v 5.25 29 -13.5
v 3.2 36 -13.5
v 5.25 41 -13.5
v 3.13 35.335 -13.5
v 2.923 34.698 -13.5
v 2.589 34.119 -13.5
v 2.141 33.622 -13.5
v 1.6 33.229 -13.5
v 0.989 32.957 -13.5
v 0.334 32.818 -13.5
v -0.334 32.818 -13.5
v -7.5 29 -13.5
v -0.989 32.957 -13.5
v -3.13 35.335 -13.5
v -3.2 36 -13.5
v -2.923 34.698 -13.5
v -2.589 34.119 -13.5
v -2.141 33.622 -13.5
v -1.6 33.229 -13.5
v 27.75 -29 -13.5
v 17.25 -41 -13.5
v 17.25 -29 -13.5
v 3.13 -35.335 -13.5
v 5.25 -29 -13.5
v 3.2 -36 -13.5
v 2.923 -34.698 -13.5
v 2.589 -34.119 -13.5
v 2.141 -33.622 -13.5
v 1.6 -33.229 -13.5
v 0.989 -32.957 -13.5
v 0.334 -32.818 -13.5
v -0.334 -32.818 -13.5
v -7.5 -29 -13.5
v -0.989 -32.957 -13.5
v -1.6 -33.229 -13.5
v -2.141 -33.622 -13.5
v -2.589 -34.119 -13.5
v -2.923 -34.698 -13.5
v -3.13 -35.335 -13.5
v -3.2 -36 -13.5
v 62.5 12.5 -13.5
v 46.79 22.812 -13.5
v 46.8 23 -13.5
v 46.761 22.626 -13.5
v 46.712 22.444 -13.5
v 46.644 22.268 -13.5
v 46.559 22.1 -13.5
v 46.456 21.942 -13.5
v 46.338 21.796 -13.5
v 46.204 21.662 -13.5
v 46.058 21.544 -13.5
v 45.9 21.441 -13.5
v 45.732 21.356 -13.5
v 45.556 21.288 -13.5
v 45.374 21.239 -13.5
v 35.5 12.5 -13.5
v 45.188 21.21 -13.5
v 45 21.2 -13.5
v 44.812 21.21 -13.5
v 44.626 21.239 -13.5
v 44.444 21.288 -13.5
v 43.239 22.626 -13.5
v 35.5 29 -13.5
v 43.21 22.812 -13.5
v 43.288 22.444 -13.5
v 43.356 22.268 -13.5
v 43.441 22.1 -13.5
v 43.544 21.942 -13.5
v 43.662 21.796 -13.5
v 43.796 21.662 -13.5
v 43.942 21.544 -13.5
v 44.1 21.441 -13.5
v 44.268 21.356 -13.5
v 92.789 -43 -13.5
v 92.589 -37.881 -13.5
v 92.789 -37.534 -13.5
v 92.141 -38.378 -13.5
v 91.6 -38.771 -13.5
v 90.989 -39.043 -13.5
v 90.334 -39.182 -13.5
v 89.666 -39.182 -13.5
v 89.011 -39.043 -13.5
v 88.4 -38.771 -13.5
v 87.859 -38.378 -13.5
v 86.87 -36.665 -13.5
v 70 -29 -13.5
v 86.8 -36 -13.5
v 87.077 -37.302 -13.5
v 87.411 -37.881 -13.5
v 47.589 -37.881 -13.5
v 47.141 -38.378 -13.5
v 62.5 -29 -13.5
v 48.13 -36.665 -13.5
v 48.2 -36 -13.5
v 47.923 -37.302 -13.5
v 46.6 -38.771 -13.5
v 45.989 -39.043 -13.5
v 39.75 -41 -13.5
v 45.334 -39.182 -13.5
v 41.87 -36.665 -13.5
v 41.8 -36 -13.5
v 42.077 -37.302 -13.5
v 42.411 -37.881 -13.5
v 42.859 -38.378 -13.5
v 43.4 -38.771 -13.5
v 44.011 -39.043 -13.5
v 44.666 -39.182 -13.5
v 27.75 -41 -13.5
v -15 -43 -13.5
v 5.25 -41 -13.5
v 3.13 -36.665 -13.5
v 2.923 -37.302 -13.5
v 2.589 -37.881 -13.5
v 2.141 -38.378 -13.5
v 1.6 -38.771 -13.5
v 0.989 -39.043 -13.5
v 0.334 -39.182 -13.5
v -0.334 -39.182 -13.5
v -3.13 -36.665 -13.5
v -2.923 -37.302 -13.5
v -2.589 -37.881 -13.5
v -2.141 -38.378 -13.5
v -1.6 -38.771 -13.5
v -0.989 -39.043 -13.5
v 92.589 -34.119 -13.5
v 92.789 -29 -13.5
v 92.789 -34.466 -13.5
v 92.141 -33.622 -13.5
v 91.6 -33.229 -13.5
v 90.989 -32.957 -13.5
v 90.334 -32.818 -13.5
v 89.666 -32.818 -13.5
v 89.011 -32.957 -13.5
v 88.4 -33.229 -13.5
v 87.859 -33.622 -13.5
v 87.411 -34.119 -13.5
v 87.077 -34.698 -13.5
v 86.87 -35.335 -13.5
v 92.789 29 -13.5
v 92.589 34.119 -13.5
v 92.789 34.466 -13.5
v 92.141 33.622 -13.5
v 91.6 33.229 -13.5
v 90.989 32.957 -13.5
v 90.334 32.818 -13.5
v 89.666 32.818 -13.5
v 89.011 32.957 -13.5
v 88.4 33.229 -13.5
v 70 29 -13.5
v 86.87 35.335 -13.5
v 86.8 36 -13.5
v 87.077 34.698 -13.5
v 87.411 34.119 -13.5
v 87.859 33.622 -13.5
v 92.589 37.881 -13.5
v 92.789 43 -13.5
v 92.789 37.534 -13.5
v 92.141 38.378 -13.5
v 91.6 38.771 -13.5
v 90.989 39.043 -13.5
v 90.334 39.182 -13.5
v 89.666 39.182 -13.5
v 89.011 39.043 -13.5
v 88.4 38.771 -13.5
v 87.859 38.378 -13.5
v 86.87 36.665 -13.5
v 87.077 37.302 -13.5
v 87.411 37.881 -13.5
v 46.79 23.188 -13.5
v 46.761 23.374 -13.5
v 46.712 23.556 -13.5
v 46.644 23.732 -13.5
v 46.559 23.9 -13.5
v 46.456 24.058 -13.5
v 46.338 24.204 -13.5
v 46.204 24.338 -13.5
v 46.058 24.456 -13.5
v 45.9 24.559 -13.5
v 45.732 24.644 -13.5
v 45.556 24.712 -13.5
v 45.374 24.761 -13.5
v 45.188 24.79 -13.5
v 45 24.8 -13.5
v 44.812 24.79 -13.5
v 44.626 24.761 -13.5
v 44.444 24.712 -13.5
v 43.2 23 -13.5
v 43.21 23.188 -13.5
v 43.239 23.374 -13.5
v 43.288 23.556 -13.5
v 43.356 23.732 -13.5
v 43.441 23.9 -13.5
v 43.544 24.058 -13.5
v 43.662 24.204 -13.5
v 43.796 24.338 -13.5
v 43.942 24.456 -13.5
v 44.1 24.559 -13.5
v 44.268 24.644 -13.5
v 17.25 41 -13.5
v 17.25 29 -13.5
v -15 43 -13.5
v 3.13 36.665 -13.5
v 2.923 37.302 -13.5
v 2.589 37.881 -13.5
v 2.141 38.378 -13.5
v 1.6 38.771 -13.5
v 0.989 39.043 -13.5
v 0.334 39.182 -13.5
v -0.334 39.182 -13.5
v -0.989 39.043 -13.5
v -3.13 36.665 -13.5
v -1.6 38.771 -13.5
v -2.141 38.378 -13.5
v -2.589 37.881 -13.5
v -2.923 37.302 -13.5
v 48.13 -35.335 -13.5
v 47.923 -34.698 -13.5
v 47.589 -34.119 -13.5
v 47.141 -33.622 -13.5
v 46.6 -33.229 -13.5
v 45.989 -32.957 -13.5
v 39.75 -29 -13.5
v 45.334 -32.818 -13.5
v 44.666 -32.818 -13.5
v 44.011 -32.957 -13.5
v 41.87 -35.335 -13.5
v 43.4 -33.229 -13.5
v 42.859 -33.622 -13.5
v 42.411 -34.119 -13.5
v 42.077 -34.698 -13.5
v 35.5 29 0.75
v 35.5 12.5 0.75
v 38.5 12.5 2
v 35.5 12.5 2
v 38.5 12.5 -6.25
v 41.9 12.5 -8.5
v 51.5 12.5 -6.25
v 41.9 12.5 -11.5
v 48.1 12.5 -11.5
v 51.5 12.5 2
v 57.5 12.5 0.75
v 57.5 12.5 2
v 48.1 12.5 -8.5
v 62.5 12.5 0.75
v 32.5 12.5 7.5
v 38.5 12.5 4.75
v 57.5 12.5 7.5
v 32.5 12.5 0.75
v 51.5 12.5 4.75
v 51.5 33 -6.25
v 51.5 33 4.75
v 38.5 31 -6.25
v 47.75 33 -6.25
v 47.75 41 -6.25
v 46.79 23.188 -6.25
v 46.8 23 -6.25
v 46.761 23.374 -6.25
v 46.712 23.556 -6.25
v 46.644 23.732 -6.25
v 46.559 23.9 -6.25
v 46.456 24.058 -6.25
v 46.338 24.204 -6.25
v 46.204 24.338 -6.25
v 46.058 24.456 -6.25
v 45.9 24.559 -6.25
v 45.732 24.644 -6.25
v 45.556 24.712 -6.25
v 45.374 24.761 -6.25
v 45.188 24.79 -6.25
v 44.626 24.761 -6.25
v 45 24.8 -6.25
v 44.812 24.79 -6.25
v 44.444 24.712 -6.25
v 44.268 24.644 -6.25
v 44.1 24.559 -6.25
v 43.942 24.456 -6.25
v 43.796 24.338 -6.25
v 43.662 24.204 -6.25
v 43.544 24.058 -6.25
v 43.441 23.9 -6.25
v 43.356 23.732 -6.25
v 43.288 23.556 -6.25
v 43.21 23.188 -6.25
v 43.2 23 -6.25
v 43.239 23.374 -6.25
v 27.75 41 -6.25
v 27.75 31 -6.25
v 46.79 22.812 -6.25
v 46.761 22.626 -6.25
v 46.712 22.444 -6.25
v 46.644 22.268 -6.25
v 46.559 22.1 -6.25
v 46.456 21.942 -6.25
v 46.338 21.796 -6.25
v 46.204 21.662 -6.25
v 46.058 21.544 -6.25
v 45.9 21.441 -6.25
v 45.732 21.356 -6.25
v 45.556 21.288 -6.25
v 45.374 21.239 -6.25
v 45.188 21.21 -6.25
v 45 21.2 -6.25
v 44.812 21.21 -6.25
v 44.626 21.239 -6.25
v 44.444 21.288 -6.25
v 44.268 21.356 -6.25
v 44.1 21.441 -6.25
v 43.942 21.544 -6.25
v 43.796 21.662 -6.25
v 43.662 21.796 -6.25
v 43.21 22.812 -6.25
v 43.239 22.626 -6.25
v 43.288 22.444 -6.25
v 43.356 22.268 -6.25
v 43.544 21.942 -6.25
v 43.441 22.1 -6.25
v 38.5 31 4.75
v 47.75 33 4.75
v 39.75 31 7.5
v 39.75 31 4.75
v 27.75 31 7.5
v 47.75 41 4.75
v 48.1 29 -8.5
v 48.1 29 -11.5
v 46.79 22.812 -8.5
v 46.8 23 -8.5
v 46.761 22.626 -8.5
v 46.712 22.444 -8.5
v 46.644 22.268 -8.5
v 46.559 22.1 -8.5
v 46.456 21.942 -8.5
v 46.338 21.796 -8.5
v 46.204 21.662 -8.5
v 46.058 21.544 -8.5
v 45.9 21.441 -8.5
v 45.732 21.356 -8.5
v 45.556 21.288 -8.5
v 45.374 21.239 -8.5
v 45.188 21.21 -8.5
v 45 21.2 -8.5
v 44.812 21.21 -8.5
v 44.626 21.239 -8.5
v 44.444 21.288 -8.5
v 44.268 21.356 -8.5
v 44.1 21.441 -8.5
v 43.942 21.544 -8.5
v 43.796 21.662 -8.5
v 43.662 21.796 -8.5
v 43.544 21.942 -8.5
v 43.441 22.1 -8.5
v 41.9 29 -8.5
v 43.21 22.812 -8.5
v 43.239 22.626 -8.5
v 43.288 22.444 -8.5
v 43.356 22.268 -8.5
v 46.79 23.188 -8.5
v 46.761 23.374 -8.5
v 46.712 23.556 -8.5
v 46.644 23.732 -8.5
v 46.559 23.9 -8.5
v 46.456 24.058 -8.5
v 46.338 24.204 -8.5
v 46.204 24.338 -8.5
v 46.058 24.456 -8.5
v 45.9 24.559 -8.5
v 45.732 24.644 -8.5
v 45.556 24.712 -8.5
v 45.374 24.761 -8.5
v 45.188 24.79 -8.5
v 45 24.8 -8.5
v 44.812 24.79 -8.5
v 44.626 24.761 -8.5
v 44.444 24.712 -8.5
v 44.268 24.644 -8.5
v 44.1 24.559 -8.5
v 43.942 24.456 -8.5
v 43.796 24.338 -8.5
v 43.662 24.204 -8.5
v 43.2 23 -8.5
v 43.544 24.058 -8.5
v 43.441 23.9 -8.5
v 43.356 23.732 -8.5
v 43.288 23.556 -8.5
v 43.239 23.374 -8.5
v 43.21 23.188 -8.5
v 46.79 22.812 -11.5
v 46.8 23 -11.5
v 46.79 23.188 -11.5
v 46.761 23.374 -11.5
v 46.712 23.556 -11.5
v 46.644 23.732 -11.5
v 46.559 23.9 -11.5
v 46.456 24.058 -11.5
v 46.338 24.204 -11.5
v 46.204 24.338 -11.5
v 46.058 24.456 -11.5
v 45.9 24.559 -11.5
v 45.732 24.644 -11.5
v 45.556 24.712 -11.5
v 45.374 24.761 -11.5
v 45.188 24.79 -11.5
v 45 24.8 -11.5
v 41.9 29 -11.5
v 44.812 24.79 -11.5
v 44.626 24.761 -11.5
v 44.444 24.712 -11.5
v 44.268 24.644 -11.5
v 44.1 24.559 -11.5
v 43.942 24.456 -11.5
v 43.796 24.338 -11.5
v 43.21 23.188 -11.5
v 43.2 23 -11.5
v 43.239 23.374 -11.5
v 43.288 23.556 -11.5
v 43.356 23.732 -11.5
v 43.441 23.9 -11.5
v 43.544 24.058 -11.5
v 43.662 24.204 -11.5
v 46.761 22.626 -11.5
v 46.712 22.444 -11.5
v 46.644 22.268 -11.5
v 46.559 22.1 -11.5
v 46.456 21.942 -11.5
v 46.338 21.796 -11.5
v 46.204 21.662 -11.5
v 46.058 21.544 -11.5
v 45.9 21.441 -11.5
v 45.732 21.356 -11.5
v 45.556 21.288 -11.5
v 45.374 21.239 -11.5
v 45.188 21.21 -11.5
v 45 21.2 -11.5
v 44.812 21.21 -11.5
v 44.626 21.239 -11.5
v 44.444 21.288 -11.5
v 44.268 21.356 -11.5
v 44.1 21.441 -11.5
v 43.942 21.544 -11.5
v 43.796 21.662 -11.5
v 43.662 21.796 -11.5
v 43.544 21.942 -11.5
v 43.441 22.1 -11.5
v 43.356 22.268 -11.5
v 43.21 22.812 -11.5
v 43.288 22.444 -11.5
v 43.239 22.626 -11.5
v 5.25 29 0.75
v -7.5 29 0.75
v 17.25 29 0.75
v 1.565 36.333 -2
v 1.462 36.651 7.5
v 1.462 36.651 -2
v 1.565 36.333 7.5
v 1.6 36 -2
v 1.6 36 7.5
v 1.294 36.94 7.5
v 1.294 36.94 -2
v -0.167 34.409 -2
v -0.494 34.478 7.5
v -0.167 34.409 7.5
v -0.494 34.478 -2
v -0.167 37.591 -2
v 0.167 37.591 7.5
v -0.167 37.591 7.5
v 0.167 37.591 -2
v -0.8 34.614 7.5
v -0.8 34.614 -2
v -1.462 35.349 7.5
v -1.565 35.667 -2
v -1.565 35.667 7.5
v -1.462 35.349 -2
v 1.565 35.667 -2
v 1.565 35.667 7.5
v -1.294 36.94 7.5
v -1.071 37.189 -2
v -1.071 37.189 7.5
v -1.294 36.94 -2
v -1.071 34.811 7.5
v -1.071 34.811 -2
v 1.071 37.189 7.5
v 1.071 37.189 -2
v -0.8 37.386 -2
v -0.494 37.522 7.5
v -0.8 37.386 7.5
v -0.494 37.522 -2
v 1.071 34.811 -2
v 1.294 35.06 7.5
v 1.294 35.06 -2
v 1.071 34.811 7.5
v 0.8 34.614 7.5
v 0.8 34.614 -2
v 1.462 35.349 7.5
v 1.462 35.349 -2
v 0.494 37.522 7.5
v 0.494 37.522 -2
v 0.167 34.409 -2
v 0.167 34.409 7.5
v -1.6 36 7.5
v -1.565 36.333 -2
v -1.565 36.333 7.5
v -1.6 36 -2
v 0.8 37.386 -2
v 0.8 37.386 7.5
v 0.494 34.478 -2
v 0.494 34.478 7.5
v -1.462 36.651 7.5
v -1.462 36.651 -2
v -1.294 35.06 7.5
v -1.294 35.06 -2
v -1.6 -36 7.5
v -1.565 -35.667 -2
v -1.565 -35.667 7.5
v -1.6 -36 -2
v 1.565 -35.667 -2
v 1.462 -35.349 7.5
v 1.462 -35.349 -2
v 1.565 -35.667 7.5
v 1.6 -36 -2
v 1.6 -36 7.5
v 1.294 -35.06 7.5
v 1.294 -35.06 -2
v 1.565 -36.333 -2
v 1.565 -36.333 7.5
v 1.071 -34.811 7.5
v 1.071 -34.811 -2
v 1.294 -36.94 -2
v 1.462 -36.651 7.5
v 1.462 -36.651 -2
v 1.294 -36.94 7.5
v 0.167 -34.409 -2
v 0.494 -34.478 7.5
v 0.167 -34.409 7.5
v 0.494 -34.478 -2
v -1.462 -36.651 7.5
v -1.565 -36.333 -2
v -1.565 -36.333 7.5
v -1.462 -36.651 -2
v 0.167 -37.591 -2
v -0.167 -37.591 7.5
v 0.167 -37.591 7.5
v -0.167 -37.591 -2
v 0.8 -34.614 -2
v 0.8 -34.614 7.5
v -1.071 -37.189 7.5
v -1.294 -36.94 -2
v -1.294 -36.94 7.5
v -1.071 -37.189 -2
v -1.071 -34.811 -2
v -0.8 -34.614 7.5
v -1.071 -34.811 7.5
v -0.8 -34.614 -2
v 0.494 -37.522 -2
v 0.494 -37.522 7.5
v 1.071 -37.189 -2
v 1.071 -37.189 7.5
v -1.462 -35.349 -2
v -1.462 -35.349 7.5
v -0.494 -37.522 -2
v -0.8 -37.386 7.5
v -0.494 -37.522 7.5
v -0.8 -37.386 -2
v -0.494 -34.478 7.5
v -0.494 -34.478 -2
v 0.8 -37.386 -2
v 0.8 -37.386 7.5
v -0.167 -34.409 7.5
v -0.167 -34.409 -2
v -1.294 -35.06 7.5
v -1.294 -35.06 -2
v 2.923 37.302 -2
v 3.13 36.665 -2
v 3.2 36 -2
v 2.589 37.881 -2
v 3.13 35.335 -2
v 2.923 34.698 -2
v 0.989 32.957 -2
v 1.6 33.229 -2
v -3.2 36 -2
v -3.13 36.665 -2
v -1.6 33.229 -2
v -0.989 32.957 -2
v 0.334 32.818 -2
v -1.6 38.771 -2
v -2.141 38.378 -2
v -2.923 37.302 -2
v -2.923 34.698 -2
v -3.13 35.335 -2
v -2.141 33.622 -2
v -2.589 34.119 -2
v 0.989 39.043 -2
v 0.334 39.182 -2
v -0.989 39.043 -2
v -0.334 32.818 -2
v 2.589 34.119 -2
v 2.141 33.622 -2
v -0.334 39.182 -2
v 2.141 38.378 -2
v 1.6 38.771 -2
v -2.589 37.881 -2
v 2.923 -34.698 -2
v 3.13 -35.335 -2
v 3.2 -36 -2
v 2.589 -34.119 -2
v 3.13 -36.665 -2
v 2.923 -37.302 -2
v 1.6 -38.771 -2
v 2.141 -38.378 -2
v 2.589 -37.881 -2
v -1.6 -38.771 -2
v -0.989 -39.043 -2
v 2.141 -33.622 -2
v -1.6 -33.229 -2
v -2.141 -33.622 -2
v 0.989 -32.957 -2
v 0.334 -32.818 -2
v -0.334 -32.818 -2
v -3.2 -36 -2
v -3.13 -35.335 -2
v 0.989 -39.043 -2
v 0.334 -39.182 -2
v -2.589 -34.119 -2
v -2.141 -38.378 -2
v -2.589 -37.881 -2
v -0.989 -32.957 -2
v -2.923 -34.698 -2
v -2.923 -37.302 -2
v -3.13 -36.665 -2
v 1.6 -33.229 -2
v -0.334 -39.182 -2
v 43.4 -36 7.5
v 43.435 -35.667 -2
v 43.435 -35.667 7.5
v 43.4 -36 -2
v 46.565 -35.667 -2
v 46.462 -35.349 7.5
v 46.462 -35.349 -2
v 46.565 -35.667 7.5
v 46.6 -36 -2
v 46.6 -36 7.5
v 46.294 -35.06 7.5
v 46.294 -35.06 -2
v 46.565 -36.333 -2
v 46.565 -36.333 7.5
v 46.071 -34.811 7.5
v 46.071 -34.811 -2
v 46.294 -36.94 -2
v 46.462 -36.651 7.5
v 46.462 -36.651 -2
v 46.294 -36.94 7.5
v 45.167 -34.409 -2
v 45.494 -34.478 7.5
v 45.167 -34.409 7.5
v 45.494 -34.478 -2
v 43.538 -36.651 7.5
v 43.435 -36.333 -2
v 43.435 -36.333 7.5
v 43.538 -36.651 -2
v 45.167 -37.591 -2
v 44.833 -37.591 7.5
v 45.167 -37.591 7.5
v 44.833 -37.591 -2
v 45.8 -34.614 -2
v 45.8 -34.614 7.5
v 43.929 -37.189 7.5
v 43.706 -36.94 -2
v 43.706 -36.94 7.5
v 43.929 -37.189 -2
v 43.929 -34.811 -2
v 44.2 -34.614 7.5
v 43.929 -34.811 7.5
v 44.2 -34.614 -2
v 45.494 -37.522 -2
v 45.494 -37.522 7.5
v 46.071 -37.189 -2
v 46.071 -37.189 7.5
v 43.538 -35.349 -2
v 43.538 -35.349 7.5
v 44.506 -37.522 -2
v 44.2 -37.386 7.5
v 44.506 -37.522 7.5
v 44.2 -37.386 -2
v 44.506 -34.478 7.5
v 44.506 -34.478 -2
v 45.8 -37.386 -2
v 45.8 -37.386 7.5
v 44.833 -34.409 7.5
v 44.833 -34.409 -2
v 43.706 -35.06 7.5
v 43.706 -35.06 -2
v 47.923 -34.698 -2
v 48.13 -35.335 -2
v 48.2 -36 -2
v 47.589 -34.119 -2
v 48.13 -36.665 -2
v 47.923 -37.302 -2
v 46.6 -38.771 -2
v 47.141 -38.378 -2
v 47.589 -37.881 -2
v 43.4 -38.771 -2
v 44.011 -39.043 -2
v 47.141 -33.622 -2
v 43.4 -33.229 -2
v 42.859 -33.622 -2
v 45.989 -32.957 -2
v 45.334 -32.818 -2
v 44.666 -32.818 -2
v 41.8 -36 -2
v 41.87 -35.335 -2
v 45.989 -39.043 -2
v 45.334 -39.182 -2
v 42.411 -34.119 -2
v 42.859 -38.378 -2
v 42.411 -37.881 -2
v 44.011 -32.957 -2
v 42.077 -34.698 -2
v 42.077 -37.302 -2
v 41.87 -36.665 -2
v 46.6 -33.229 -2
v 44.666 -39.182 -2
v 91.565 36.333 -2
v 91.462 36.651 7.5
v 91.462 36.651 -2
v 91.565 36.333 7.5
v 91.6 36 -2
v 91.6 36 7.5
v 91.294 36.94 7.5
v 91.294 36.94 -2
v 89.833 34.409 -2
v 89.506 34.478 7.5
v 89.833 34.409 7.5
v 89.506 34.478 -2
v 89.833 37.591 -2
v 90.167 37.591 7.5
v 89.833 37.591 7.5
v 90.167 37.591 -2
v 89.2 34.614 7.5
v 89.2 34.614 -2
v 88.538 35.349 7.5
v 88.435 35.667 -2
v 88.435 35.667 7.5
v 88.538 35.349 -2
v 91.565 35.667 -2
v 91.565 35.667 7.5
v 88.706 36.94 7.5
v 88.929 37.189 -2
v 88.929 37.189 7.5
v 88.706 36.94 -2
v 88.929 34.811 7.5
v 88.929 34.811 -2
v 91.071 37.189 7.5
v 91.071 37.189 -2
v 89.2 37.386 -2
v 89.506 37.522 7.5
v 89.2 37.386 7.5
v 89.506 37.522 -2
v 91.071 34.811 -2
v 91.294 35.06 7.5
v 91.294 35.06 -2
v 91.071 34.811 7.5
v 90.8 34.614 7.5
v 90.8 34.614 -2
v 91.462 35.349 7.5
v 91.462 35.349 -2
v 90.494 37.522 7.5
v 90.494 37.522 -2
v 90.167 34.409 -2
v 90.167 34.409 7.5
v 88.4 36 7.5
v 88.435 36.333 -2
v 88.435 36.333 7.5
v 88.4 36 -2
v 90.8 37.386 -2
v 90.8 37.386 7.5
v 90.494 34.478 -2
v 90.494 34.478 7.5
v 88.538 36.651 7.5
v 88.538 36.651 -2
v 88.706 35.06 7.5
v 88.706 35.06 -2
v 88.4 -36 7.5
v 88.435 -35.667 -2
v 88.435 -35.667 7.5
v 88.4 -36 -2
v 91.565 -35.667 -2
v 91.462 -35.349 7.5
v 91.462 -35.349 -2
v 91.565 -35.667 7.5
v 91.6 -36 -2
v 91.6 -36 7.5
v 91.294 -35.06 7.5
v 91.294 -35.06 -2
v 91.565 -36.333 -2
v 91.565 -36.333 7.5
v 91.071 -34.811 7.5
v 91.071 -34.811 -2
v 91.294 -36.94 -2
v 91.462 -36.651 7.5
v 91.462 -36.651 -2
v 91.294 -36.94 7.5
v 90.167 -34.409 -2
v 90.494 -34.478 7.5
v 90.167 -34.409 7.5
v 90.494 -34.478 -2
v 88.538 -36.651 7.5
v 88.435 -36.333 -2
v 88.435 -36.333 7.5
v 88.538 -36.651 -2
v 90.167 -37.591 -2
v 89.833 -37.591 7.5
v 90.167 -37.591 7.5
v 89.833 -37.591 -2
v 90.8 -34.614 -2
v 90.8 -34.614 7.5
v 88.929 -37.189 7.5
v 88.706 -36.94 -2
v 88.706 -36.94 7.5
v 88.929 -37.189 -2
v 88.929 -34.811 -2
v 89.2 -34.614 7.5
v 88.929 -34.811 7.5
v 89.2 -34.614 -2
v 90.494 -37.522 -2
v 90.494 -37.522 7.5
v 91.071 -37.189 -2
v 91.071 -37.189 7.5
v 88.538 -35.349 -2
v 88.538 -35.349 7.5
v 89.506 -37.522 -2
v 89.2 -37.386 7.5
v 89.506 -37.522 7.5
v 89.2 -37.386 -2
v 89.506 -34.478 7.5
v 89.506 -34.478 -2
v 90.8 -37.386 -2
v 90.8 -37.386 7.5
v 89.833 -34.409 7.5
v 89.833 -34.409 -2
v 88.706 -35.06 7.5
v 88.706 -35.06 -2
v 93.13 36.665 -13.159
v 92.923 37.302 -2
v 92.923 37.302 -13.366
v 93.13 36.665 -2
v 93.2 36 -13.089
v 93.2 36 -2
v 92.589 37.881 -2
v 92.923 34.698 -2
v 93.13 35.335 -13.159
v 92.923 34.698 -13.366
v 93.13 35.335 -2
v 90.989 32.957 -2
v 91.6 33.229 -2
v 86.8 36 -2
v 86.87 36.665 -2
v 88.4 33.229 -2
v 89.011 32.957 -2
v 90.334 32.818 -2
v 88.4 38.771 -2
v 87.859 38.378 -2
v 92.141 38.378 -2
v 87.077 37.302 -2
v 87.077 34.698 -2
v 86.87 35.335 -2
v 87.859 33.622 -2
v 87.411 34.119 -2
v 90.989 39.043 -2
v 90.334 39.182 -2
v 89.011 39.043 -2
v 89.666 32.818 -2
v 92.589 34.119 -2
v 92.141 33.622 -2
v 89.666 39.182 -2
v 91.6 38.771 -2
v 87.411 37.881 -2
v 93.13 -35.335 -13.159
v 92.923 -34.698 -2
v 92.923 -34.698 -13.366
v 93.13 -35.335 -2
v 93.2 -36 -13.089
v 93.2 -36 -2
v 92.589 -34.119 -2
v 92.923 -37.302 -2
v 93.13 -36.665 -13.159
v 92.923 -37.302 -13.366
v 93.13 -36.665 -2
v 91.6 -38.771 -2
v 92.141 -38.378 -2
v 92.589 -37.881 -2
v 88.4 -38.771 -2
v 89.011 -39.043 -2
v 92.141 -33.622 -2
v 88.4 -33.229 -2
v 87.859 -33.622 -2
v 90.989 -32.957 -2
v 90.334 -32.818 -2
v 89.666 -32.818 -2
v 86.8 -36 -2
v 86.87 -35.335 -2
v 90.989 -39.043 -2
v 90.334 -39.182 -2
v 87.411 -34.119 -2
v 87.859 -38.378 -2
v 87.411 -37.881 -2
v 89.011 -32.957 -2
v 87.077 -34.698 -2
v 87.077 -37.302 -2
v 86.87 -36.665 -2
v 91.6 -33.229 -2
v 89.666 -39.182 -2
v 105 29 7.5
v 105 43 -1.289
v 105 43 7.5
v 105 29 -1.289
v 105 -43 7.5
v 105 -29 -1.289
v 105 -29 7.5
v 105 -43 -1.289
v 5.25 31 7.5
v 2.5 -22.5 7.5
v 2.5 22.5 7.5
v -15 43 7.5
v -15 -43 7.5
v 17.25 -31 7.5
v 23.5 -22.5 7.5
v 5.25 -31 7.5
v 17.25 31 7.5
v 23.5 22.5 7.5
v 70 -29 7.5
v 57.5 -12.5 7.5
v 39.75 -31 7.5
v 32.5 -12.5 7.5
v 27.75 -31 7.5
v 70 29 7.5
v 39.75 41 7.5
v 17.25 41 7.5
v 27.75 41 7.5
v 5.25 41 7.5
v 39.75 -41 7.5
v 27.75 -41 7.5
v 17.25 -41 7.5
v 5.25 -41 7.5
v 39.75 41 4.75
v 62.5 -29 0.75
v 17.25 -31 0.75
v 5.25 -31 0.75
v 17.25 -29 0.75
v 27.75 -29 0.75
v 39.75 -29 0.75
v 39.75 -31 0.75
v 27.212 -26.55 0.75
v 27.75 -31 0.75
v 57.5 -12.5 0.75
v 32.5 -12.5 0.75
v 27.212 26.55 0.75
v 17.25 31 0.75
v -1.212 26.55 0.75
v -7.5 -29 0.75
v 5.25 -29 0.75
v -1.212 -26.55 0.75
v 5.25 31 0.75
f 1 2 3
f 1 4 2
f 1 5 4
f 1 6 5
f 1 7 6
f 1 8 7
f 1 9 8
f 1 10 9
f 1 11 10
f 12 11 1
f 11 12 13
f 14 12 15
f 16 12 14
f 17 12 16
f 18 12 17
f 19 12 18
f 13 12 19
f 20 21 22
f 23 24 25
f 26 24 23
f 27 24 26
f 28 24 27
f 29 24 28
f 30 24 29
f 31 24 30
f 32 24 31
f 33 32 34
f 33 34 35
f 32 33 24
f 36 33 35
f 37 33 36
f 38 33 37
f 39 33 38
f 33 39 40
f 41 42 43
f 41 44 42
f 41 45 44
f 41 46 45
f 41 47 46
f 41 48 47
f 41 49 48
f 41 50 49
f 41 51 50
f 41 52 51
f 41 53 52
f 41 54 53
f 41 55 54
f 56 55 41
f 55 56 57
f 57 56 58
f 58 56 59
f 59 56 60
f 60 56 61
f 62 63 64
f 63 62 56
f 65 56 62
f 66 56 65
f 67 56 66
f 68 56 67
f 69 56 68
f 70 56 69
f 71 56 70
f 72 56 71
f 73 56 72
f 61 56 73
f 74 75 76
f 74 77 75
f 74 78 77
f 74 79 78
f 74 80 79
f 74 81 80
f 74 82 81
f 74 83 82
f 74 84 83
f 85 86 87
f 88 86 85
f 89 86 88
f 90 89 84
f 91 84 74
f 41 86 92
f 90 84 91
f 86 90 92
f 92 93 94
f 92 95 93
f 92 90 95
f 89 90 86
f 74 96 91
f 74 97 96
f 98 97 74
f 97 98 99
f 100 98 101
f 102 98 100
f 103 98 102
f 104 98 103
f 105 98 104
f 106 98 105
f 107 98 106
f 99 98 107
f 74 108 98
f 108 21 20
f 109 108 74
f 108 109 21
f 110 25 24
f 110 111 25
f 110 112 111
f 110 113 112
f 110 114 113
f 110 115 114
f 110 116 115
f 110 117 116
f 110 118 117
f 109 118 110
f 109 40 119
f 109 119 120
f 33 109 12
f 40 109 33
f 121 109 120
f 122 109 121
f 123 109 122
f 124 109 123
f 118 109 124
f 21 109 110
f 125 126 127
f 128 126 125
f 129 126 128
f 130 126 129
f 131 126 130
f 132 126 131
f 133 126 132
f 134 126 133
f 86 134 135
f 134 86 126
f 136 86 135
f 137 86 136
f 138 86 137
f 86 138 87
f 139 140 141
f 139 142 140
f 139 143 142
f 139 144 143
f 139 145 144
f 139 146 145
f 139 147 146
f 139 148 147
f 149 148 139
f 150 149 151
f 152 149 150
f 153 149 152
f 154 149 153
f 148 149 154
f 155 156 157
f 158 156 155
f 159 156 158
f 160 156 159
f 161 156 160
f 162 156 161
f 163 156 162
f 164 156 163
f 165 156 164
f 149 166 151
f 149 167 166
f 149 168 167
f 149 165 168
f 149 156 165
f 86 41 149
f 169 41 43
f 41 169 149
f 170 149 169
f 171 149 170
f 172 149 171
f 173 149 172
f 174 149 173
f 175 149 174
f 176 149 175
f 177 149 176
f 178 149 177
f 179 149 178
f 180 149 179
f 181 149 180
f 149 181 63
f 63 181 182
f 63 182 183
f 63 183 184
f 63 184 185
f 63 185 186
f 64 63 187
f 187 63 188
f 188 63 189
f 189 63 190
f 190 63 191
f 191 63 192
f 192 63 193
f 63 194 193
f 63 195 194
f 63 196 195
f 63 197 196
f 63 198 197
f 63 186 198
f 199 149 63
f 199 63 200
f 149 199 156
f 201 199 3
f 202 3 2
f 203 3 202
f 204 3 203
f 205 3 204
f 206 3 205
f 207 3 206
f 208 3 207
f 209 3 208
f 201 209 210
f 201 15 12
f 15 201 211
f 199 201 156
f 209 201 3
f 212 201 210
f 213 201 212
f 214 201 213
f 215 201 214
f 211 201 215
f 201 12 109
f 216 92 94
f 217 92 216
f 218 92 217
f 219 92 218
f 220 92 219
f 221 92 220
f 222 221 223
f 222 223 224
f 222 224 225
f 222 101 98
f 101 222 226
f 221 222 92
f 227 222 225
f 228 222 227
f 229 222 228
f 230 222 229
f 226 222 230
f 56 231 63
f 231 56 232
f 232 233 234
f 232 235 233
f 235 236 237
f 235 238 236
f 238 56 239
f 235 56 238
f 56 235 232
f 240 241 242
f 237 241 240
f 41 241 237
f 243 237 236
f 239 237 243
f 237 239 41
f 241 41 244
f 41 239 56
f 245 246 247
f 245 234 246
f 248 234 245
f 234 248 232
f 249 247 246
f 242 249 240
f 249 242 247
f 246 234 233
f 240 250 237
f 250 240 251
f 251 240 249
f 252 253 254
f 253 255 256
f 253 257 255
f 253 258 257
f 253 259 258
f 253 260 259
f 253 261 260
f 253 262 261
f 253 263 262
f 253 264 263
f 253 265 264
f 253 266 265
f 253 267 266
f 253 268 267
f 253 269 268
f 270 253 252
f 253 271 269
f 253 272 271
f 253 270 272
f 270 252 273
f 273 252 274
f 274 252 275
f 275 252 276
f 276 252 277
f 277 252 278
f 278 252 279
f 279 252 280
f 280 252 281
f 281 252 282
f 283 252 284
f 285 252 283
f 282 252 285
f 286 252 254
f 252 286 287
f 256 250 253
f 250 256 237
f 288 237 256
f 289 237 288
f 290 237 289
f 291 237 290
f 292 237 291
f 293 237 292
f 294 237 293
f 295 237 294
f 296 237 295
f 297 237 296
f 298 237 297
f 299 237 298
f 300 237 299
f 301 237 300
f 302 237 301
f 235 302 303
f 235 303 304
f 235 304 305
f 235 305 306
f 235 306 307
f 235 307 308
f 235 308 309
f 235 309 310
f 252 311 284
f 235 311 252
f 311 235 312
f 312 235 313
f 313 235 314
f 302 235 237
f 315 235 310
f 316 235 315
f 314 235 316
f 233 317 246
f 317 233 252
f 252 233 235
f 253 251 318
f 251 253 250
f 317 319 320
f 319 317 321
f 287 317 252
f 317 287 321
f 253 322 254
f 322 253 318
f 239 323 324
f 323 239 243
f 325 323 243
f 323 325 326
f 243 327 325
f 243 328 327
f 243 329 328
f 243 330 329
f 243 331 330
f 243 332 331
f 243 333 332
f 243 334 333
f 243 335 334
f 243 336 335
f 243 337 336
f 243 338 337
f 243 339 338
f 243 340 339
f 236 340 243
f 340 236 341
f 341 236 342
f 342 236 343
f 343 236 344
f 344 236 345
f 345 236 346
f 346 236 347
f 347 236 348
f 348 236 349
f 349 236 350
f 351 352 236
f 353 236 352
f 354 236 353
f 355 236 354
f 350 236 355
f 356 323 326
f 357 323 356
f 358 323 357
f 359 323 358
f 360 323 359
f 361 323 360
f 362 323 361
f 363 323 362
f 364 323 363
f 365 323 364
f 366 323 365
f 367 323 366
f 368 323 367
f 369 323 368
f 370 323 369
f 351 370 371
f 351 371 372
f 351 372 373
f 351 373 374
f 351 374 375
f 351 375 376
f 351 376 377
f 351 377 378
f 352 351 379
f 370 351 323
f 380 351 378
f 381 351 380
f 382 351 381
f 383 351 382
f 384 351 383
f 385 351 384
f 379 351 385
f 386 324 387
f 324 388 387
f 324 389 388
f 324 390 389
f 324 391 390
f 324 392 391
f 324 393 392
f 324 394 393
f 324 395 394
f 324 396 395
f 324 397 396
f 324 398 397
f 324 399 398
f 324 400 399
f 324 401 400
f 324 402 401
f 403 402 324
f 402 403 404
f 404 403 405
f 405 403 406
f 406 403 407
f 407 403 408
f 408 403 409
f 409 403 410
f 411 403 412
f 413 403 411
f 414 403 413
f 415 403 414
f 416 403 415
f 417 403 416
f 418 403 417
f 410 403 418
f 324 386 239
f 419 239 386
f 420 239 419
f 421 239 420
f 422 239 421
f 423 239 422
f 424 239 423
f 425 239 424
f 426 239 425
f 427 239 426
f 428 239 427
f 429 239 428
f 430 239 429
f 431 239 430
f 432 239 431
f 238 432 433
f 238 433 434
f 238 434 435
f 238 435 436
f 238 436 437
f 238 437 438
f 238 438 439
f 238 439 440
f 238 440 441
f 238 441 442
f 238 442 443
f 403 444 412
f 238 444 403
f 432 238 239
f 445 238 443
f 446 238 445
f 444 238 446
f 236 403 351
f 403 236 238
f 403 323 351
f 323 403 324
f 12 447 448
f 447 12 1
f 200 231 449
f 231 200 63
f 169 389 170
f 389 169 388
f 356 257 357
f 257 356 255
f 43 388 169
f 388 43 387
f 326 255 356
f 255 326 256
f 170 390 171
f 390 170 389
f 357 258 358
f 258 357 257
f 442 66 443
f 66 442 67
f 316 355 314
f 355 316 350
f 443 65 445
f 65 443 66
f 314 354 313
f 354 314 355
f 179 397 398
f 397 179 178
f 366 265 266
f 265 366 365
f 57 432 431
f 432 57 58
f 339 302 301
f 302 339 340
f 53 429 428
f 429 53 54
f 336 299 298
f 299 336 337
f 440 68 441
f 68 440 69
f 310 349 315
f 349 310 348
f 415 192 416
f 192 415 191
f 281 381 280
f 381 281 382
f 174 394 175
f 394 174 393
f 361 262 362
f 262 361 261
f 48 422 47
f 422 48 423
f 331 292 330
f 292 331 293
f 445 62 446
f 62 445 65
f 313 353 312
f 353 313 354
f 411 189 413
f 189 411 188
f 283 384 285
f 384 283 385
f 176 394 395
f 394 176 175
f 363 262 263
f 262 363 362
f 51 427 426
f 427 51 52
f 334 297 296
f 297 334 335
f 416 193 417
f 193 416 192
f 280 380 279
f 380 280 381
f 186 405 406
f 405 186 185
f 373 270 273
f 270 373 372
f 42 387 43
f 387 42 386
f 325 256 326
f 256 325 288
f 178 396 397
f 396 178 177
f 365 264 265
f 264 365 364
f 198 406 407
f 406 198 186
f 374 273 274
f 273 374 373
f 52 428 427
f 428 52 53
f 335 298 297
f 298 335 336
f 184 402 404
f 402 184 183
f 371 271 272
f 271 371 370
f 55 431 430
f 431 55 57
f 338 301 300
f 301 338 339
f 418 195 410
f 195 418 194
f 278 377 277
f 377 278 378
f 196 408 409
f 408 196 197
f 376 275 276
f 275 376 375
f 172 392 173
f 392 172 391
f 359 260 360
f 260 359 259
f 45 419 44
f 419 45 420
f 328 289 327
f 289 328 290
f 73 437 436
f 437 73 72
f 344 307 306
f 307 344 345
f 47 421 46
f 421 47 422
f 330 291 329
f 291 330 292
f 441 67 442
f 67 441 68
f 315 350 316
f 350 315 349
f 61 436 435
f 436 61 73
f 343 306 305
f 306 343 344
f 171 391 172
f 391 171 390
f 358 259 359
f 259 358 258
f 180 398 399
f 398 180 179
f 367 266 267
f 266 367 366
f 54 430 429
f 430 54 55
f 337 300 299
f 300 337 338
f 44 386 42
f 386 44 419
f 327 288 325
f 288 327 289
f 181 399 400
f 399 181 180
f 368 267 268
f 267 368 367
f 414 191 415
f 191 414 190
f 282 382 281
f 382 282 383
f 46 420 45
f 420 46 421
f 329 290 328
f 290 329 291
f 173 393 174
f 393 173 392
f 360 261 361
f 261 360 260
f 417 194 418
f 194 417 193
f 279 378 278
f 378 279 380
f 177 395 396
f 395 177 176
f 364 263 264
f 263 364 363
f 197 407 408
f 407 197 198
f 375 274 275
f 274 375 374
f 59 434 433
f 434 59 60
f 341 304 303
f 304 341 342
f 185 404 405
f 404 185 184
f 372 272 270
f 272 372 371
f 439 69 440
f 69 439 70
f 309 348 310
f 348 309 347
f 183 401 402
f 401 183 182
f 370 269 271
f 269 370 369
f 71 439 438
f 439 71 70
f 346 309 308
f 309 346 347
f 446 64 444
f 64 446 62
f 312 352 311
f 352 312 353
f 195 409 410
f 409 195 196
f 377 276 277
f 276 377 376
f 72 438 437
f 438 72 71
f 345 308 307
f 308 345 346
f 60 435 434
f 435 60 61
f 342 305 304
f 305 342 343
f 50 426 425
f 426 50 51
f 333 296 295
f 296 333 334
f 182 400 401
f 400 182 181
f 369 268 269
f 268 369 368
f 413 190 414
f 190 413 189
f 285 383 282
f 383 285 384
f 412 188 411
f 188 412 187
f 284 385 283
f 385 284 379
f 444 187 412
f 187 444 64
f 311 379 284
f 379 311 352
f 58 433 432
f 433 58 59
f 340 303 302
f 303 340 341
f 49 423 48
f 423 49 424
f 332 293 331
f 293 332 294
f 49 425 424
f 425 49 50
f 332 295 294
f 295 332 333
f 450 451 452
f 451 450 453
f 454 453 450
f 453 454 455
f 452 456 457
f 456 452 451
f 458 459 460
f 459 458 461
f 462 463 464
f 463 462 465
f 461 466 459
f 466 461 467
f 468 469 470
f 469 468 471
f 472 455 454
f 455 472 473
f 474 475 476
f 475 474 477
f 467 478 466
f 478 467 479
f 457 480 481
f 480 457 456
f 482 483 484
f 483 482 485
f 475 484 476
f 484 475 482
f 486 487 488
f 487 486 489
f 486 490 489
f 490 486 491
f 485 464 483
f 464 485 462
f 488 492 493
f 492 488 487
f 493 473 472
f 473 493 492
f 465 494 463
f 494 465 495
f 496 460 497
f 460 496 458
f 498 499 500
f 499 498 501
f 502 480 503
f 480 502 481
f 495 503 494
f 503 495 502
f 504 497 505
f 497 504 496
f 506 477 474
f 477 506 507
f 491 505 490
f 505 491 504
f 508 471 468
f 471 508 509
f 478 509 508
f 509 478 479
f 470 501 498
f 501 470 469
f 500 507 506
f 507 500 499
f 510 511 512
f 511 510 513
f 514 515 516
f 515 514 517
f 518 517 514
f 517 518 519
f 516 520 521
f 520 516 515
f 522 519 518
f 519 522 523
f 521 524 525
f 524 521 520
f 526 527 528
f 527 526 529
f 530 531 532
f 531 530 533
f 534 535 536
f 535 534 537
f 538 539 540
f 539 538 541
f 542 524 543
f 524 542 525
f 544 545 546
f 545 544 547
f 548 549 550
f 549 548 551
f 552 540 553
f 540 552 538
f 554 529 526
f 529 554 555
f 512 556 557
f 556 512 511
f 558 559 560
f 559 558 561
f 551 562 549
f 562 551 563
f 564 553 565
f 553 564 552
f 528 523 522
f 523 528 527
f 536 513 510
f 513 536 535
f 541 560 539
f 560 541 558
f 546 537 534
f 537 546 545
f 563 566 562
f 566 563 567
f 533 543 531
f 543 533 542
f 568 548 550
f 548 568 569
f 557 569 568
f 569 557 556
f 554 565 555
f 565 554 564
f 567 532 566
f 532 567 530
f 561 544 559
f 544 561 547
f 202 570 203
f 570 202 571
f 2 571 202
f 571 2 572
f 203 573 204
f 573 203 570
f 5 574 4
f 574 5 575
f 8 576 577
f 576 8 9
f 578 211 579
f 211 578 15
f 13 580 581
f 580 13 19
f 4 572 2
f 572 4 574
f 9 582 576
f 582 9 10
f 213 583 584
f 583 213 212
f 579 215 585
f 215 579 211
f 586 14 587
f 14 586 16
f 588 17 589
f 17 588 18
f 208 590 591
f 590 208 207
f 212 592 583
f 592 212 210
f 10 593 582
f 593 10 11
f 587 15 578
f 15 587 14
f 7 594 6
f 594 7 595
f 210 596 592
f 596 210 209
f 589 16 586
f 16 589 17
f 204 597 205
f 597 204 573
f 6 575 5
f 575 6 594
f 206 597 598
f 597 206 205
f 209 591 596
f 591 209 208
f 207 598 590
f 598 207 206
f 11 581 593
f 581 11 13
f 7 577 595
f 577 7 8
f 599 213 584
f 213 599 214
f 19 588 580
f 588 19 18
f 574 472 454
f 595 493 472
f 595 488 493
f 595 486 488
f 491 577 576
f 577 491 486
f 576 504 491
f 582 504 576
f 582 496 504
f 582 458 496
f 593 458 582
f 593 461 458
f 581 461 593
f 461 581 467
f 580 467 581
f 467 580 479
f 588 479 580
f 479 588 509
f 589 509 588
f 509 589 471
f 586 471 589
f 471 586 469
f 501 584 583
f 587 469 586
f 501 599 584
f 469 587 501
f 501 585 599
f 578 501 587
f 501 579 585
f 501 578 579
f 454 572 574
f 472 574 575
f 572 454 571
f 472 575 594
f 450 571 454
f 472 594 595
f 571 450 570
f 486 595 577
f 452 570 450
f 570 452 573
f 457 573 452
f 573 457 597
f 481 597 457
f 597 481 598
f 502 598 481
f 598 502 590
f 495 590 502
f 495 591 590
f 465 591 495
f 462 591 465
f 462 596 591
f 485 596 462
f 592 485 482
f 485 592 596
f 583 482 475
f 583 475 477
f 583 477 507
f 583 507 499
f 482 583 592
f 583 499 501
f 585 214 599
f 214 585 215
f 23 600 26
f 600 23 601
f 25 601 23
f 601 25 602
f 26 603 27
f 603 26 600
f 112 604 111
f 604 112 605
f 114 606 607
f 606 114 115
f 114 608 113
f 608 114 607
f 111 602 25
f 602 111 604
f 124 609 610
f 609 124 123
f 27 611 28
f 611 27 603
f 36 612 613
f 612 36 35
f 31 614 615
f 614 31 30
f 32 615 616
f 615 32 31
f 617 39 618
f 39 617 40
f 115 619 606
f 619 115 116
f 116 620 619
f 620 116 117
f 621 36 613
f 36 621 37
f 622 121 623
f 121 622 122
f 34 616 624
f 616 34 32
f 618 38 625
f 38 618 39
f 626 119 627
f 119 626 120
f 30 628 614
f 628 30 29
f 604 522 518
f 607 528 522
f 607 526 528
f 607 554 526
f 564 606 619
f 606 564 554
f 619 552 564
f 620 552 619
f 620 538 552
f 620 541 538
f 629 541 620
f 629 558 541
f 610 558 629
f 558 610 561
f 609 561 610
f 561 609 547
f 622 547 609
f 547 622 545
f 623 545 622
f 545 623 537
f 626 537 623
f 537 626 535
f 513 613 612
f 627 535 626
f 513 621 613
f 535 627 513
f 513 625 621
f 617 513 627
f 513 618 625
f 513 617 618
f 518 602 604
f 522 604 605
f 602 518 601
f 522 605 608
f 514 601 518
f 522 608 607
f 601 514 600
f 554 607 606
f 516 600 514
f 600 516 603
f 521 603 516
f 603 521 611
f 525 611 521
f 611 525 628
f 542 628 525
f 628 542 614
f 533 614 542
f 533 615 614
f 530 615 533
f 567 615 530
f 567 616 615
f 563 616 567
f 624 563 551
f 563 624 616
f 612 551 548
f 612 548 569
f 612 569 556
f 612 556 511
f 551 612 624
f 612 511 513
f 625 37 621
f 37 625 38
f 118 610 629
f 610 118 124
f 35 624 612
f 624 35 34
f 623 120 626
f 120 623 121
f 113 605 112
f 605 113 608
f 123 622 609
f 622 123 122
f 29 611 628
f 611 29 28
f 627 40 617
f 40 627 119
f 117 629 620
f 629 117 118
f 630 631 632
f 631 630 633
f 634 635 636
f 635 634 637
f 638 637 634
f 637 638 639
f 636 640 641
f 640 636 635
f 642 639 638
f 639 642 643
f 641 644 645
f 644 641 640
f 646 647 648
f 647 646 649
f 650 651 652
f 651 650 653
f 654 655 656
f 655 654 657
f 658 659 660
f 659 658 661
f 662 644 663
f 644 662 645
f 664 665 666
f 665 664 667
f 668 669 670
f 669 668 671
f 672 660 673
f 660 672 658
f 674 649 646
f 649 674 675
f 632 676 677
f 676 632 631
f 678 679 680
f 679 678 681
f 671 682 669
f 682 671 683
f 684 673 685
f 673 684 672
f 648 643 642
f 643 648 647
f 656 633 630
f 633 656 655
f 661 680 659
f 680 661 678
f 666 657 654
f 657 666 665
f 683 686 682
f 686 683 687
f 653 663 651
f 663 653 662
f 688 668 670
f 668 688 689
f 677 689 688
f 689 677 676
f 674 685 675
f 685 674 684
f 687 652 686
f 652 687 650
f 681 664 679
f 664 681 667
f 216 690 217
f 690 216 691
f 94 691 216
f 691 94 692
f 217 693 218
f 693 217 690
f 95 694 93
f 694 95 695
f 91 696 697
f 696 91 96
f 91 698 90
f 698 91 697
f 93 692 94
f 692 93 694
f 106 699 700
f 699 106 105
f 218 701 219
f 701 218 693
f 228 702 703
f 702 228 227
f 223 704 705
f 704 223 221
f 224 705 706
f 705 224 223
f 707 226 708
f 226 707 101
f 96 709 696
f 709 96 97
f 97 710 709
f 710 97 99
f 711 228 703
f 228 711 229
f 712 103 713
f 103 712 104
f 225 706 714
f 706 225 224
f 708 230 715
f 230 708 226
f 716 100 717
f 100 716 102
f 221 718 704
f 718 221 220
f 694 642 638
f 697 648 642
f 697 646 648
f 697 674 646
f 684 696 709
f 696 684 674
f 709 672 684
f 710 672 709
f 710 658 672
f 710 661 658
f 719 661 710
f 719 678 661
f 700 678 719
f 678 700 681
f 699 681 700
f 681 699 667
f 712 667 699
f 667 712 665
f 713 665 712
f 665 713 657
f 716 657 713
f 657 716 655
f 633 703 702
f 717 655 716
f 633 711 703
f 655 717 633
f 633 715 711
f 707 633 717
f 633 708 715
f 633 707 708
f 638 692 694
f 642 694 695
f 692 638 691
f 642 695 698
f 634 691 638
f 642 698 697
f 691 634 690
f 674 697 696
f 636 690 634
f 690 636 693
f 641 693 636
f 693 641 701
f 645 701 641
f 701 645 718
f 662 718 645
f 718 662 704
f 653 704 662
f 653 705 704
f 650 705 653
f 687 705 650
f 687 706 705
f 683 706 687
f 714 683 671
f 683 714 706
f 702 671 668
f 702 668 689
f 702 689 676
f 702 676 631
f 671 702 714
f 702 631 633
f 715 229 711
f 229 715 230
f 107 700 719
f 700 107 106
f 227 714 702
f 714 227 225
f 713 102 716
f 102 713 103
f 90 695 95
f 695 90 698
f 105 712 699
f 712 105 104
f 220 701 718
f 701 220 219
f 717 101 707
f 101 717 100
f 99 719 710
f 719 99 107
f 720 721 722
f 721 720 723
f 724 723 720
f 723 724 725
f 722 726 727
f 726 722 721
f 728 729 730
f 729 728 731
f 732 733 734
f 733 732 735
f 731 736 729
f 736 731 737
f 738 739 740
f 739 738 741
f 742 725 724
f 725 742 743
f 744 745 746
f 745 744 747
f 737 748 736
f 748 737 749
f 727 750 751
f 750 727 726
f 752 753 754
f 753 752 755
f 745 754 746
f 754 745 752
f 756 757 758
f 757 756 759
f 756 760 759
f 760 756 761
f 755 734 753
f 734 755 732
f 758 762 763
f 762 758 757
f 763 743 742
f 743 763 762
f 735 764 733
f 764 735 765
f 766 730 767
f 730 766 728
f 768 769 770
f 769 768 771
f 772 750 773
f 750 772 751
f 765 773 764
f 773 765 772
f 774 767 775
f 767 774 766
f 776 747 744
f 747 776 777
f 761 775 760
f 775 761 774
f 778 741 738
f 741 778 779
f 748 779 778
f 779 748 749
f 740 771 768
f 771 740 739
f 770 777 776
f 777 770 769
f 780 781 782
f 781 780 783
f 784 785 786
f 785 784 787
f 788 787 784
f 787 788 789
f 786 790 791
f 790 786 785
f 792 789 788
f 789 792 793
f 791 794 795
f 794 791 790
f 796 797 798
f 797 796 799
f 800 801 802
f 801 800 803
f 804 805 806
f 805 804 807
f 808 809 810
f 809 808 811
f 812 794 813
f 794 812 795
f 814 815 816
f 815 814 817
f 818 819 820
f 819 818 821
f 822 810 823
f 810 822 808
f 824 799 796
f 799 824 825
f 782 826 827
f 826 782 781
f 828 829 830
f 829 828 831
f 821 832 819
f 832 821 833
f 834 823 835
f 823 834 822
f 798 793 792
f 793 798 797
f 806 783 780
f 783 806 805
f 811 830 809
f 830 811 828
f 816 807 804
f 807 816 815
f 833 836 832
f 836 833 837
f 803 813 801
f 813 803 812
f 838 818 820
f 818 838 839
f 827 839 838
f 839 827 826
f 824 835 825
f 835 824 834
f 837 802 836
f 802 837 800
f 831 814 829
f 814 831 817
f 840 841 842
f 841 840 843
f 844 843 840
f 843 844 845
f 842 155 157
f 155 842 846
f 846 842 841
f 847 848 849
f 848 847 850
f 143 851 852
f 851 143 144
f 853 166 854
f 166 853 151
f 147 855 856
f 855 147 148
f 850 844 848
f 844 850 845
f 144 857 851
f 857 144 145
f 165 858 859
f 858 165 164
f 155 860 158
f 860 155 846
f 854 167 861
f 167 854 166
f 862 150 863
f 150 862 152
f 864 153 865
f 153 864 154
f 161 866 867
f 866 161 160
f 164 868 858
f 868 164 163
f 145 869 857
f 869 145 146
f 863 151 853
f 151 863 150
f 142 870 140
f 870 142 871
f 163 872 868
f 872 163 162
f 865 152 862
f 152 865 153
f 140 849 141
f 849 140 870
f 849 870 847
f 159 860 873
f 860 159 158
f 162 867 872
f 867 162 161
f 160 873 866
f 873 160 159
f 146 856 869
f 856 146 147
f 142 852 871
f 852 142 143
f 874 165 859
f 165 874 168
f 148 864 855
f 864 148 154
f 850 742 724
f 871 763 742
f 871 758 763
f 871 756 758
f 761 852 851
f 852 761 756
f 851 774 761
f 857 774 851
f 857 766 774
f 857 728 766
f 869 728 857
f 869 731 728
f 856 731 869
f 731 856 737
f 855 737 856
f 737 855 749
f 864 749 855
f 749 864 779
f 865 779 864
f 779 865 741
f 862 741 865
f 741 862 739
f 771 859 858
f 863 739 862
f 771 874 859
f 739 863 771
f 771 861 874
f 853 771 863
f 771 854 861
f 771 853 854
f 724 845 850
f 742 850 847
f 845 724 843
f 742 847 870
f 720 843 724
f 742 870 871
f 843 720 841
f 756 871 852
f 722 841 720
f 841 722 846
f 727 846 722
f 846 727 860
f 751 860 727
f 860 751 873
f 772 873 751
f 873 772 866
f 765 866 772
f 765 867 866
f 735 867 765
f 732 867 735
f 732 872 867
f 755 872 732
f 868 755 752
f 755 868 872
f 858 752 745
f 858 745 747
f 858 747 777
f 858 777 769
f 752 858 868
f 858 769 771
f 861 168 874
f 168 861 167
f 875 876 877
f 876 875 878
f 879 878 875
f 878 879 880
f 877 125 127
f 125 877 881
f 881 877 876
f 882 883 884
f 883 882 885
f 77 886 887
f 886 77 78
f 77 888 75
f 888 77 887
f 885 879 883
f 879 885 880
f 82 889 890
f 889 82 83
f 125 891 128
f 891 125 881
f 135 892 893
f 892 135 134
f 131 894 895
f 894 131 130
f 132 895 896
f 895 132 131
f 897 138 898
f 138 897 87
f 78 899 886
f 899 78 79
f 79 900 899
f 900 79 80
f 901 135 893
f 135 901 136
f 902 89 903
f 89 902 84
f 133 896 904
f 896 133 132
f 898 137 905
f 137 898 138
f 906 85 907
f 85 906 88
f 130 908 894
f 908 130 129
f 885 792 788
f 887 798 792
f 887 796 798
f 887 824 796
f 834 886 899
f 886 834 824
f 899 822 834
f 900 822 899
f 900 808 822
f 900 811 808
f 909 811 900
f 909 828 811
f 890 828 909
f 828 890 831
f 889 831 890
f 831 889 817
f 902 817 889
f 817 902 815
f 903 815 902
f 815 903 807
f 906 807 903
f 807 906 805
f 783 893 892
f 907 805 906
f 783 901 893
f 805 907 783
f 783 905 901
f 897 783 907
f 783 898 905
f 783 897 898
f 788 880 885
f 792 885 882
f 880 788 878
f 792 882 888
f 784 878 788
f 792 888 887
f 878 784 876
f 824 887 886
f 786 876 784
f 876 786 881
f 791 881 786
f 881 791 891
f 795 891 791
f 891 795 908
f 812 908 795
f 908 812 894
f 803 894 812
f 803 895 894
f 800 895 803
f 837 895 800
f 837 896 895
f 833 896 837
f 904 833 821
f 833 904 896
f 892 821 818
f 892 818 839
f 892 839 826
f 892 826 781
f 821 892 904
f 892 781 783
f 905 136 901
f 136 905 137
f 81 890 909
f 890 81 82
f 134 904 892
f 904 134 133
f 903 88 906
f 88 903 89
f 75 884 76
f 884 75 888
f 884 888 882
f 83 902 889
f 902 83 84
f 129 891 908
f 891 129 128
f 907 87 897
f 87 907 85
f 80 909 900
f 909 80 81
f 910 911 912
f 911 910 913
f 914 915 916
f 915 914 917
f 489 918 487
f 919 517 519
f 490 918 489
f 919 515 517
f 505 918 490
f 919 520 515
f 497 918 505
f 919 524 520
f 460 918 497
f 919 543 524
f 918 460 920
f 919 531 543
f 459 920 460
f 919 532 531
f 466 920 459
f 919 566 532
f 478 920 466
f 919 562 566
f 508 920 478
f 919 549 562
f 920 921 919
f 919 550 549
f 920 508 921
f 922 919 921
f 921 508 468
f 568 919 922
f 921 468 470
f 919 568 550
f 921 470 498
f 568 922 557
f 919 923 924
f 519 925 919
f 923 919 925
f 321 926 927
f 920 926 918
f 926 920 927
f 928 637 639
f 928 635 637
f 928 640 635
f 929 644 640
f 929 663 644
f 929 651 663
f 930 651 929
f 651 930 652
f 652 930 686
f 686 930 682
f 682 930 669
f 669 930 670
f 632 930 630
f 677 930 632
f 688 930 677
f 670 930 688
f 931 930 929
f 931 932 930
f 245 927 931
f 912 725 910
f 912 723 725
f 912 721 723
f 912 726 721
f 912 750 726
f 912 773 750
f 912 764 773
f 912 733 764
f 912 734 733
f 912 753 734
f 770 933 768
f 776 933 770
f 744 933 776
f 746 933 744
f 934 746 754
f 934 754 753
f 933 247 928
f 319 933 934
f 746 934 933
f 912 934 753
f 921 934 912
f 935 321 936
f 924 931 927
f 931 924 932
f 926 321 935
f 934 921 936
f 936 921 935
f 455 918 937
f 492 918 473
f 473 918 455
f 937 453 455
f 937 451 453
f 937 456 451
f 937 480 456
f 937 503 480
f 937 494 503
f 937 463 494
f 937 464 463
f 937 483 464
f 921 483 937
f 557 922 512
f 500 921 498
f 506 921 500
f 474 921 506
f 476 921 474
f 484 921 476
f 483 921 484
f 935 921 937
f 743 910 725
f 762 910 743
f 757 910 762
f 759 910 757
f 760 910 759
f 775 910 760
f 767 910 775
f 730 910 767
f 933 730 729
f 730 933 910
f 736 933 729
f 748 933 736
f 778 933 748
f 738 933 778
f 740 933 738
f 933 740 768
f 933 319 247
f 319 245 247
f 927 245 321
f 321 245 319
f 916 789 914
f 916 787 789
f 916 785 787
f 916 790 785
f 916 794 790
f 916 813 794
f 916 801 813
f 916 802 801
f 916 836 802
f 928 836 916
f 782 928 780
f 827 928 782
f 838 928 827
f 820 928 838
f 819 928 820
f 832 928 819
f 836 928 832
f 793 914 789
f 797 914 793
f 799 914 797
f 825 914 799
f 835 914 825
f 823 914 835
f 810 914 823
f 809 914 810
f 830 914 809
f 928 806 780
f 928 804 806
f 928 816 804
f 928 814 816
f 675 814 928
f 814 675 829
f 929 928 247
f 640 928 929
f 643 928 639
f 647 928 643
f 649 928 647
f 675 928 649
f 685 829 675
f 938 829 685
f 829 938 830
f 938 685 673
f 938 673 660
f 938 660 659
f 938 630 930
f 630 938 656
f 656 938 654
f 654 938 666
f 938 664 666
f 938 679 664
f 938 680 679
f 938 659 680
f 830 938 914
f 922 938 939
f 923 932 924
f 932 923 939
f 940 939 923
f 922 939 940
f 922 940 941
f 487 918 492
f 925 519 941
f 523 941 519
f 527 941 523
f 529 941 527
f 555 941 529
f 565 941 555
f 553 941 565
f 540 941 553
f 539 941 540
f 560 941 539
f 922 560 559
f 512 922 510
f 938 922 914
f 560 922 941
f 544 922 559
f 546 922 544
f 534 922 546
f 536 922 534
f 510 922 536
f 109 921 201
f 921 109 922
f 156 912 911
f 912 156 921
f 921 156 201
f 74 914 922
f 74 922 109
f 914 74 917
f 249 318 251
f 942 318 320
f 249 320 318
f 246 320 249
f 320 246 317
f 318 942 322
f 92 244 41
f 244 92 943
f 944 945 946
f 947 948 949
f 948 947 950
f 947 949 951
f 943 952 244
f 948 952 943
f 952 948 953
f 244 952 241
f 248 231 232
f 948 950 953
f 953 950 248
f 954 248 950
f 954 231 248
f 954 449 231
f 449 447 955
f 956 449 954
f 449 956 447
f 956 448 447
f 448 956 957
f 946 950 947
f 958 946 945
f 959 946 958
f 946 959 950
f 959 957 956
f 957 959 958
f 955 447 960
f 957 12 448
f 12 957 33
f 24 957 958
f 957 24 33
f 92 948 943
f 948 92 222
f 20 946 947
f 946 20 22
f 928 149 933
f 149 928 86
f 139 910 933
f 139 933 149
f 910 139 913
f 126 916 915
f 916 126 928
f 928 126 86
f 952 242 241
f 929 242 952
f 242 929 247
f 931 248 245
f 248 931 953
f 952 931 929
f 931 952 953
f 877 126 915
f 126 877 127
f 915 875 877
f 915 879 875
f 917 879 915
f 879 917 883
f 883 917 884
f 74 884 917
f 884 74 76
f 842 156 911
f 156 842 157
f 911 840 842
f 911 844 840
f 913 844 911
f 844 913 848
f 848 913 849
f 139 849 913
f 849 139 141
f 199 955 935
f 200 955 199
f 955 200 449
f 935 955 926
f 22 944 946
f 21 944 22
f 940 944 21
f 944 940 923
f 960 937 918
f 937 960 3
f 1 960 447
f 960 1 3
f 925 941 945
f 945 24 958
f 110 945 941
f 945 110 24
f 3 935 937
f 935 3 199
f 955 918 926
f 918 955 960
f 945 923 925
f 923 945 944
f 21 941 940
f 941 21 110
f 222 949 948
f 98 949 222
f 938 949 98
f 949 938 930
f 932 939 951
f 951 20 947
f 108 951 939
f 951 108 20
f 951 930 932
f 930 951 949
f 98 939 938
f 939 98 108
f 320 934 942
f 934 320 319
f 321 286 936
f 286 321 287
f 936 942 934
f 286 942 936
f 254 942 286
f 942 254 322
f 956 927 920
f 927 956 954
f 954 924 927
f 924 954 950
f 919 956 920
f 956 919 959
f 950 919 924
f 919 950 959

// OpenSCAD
//ReaderUpperHalf.scad (c) by Embecosm Ltd.
//
//ReaderUpperHalf.scad is licensed under a
//Creative Commons Attribution-ShareAlike 4.0 International License.
//
//You should have received a copy of the license along with this
//work. If not, see <http://creativecommons.org/licenses/by-sa/4.0/>.

//rotate([180,0,0]){
    difference(){
        union(){
            difference(){
                //motor holster shenanigans
                translate([50,25,-5.75])
                    cube([29,25,15.5],center=true);
                translate([45,20.5,-0.75])
                    cube([13,25,11],center=true); 
                translate([33.75,36,0])
                    cube([12,10,14],center=true);
                translate([37.75,36,-2])
                    cube([20,10,10],center=true);
                translate([45,0,-10])
                    cube([6.2,58,3],center=true);
                translate([45,23,-10])
                    cylinder(r=1.8, h=10, $fn=60, center=true);
            };
            difference(){
                //main body
                union(){
                    translate([45,0,-3])
                        cube([120,86,21],center=true);
                };
                //motor hole
                translate([45,20.5,-0.75])
                    cube([13,25,11],center=true);
                //general central cavity
                translate([27.5,0,-9.25])
                    cube([70,58,20],center=true);
                //in tray
                translate([120,0,0])
                    cube([100,58,34],center=true);
                //wheel hole
                translate([45,0,0])
                    cube([25,25,34],center=true);
                //slanty end
                translate([139,0,-38])
                    rotate([0,45,0])
                        cube([100,146,34],center=true);
                //wire holes
                translate([11.25,36,0])
                    cube([12,10,17],center=true);
                translate([11.25,-36,0])
                    cube([12,10,17],center=true);
                translate([33.75,-36,0])
                    cube([12,10,17],center=true);
                translate([33.75,36,1.75])
                    cube([12,10,16],center=true);
                translate([37.75,36,-0.75])
                    cube([20,10,11],center=true);
                //connections to main cavity
                translate([11.25,0,-9.25])
                    cube([12,82,20],center=true);
                translate([33.75,-18,-9.25])
                    cube([12,46,20],center=true);
                //LED Holes
                translate([5,0,0])
                    rotate([0,45,0])
                        union(){
                            cube([7,46,7], center=true);
                                cylinder(r=2.7, h=27, center=true, $fn=30);
                                translate([0,7.62,0])
                                        cylinder(r=2.7, h=27, center=true, $fn=30);
                                translate([0,-7.62,0])
                                        cylinder(r=2.7, h=27, center=true, $fn=30);
                                translate([0,15.24,0])
                                        cylinder(r=2.7, h=27, center=true, $fn=30);
                                translate([0,-15.24,0])
                                        cylinder(r=2.7, h=27, center=true, $fn=30);
                            };
                //LDR Holes
                translate([24,0,0])
                    rotate([0,-45,0])
                        union(){
                                cylinder(r=2.3, h=27, center=true, $fn=30);
                                translate([0,7.62,0])
                                        cylinder(r=2.3, h=27, center=true, $fn=30);
                                translate([0,-7.62,0])
                                        cylinder(r=2.3, h=27, center=true, $fn=30);
                                translate([0,15.24,0])
                                        cylinder(r=2.3, h=27, center=true, $fn=30);
                                translate([0,-15.24,0])
                                        cylinder(r=2.3, h=27, center=true, $fn=30);
                            };
                //Bolt holes
                union(){
                    translate([0,36,0])
                            cylinder(r=1.6, h=22, center=true, $fn=30);
                    translate([0,-36,0])
                            cylinder(r=1.6, h=22, center=true, $fn=30);
                    translate([0,36,-8])
                            cylinder(r=3.2, h=12, center=true, $fn=30);
                    translate([0,-36,-8])
                            cylinder(r=3.2, h=12, center=true, $fn=30);
                };
                translate([45,0,0]){
                    union(){
                        translate([0,-36,0])
                                cylinder(r=1.6, h=22, center=true, $fn=30);
                        translate([0,-36,-8])
                                cylinder(r=3.2, h=12, center=true, $fn=30);
                    };
                };
                translate([90,0,0]){
                    union(){
                        translate([0,36,0])
                                cylinder(r=1.6, h=22, center=true, $fn=30);
                        translate([0,-36,0])
                                cylinder(r=1.6, h=22, center=true, $fn=30);
                        translate([0,36,-8])
                                cylinder(r=3.2, h=12, center=true, $fn=30);
                        translate([0,-36,-8])
                                cylinder(r=3.2, h=12, center=true, $fn=30);
                    };
                };
            };
        };
        hull(){
            translate([13,0,7])
                cube([21,45,1],center=true);
            translate([13,0,-3])
                cube([32,57,1],center=true);
        };            
    };
//};
